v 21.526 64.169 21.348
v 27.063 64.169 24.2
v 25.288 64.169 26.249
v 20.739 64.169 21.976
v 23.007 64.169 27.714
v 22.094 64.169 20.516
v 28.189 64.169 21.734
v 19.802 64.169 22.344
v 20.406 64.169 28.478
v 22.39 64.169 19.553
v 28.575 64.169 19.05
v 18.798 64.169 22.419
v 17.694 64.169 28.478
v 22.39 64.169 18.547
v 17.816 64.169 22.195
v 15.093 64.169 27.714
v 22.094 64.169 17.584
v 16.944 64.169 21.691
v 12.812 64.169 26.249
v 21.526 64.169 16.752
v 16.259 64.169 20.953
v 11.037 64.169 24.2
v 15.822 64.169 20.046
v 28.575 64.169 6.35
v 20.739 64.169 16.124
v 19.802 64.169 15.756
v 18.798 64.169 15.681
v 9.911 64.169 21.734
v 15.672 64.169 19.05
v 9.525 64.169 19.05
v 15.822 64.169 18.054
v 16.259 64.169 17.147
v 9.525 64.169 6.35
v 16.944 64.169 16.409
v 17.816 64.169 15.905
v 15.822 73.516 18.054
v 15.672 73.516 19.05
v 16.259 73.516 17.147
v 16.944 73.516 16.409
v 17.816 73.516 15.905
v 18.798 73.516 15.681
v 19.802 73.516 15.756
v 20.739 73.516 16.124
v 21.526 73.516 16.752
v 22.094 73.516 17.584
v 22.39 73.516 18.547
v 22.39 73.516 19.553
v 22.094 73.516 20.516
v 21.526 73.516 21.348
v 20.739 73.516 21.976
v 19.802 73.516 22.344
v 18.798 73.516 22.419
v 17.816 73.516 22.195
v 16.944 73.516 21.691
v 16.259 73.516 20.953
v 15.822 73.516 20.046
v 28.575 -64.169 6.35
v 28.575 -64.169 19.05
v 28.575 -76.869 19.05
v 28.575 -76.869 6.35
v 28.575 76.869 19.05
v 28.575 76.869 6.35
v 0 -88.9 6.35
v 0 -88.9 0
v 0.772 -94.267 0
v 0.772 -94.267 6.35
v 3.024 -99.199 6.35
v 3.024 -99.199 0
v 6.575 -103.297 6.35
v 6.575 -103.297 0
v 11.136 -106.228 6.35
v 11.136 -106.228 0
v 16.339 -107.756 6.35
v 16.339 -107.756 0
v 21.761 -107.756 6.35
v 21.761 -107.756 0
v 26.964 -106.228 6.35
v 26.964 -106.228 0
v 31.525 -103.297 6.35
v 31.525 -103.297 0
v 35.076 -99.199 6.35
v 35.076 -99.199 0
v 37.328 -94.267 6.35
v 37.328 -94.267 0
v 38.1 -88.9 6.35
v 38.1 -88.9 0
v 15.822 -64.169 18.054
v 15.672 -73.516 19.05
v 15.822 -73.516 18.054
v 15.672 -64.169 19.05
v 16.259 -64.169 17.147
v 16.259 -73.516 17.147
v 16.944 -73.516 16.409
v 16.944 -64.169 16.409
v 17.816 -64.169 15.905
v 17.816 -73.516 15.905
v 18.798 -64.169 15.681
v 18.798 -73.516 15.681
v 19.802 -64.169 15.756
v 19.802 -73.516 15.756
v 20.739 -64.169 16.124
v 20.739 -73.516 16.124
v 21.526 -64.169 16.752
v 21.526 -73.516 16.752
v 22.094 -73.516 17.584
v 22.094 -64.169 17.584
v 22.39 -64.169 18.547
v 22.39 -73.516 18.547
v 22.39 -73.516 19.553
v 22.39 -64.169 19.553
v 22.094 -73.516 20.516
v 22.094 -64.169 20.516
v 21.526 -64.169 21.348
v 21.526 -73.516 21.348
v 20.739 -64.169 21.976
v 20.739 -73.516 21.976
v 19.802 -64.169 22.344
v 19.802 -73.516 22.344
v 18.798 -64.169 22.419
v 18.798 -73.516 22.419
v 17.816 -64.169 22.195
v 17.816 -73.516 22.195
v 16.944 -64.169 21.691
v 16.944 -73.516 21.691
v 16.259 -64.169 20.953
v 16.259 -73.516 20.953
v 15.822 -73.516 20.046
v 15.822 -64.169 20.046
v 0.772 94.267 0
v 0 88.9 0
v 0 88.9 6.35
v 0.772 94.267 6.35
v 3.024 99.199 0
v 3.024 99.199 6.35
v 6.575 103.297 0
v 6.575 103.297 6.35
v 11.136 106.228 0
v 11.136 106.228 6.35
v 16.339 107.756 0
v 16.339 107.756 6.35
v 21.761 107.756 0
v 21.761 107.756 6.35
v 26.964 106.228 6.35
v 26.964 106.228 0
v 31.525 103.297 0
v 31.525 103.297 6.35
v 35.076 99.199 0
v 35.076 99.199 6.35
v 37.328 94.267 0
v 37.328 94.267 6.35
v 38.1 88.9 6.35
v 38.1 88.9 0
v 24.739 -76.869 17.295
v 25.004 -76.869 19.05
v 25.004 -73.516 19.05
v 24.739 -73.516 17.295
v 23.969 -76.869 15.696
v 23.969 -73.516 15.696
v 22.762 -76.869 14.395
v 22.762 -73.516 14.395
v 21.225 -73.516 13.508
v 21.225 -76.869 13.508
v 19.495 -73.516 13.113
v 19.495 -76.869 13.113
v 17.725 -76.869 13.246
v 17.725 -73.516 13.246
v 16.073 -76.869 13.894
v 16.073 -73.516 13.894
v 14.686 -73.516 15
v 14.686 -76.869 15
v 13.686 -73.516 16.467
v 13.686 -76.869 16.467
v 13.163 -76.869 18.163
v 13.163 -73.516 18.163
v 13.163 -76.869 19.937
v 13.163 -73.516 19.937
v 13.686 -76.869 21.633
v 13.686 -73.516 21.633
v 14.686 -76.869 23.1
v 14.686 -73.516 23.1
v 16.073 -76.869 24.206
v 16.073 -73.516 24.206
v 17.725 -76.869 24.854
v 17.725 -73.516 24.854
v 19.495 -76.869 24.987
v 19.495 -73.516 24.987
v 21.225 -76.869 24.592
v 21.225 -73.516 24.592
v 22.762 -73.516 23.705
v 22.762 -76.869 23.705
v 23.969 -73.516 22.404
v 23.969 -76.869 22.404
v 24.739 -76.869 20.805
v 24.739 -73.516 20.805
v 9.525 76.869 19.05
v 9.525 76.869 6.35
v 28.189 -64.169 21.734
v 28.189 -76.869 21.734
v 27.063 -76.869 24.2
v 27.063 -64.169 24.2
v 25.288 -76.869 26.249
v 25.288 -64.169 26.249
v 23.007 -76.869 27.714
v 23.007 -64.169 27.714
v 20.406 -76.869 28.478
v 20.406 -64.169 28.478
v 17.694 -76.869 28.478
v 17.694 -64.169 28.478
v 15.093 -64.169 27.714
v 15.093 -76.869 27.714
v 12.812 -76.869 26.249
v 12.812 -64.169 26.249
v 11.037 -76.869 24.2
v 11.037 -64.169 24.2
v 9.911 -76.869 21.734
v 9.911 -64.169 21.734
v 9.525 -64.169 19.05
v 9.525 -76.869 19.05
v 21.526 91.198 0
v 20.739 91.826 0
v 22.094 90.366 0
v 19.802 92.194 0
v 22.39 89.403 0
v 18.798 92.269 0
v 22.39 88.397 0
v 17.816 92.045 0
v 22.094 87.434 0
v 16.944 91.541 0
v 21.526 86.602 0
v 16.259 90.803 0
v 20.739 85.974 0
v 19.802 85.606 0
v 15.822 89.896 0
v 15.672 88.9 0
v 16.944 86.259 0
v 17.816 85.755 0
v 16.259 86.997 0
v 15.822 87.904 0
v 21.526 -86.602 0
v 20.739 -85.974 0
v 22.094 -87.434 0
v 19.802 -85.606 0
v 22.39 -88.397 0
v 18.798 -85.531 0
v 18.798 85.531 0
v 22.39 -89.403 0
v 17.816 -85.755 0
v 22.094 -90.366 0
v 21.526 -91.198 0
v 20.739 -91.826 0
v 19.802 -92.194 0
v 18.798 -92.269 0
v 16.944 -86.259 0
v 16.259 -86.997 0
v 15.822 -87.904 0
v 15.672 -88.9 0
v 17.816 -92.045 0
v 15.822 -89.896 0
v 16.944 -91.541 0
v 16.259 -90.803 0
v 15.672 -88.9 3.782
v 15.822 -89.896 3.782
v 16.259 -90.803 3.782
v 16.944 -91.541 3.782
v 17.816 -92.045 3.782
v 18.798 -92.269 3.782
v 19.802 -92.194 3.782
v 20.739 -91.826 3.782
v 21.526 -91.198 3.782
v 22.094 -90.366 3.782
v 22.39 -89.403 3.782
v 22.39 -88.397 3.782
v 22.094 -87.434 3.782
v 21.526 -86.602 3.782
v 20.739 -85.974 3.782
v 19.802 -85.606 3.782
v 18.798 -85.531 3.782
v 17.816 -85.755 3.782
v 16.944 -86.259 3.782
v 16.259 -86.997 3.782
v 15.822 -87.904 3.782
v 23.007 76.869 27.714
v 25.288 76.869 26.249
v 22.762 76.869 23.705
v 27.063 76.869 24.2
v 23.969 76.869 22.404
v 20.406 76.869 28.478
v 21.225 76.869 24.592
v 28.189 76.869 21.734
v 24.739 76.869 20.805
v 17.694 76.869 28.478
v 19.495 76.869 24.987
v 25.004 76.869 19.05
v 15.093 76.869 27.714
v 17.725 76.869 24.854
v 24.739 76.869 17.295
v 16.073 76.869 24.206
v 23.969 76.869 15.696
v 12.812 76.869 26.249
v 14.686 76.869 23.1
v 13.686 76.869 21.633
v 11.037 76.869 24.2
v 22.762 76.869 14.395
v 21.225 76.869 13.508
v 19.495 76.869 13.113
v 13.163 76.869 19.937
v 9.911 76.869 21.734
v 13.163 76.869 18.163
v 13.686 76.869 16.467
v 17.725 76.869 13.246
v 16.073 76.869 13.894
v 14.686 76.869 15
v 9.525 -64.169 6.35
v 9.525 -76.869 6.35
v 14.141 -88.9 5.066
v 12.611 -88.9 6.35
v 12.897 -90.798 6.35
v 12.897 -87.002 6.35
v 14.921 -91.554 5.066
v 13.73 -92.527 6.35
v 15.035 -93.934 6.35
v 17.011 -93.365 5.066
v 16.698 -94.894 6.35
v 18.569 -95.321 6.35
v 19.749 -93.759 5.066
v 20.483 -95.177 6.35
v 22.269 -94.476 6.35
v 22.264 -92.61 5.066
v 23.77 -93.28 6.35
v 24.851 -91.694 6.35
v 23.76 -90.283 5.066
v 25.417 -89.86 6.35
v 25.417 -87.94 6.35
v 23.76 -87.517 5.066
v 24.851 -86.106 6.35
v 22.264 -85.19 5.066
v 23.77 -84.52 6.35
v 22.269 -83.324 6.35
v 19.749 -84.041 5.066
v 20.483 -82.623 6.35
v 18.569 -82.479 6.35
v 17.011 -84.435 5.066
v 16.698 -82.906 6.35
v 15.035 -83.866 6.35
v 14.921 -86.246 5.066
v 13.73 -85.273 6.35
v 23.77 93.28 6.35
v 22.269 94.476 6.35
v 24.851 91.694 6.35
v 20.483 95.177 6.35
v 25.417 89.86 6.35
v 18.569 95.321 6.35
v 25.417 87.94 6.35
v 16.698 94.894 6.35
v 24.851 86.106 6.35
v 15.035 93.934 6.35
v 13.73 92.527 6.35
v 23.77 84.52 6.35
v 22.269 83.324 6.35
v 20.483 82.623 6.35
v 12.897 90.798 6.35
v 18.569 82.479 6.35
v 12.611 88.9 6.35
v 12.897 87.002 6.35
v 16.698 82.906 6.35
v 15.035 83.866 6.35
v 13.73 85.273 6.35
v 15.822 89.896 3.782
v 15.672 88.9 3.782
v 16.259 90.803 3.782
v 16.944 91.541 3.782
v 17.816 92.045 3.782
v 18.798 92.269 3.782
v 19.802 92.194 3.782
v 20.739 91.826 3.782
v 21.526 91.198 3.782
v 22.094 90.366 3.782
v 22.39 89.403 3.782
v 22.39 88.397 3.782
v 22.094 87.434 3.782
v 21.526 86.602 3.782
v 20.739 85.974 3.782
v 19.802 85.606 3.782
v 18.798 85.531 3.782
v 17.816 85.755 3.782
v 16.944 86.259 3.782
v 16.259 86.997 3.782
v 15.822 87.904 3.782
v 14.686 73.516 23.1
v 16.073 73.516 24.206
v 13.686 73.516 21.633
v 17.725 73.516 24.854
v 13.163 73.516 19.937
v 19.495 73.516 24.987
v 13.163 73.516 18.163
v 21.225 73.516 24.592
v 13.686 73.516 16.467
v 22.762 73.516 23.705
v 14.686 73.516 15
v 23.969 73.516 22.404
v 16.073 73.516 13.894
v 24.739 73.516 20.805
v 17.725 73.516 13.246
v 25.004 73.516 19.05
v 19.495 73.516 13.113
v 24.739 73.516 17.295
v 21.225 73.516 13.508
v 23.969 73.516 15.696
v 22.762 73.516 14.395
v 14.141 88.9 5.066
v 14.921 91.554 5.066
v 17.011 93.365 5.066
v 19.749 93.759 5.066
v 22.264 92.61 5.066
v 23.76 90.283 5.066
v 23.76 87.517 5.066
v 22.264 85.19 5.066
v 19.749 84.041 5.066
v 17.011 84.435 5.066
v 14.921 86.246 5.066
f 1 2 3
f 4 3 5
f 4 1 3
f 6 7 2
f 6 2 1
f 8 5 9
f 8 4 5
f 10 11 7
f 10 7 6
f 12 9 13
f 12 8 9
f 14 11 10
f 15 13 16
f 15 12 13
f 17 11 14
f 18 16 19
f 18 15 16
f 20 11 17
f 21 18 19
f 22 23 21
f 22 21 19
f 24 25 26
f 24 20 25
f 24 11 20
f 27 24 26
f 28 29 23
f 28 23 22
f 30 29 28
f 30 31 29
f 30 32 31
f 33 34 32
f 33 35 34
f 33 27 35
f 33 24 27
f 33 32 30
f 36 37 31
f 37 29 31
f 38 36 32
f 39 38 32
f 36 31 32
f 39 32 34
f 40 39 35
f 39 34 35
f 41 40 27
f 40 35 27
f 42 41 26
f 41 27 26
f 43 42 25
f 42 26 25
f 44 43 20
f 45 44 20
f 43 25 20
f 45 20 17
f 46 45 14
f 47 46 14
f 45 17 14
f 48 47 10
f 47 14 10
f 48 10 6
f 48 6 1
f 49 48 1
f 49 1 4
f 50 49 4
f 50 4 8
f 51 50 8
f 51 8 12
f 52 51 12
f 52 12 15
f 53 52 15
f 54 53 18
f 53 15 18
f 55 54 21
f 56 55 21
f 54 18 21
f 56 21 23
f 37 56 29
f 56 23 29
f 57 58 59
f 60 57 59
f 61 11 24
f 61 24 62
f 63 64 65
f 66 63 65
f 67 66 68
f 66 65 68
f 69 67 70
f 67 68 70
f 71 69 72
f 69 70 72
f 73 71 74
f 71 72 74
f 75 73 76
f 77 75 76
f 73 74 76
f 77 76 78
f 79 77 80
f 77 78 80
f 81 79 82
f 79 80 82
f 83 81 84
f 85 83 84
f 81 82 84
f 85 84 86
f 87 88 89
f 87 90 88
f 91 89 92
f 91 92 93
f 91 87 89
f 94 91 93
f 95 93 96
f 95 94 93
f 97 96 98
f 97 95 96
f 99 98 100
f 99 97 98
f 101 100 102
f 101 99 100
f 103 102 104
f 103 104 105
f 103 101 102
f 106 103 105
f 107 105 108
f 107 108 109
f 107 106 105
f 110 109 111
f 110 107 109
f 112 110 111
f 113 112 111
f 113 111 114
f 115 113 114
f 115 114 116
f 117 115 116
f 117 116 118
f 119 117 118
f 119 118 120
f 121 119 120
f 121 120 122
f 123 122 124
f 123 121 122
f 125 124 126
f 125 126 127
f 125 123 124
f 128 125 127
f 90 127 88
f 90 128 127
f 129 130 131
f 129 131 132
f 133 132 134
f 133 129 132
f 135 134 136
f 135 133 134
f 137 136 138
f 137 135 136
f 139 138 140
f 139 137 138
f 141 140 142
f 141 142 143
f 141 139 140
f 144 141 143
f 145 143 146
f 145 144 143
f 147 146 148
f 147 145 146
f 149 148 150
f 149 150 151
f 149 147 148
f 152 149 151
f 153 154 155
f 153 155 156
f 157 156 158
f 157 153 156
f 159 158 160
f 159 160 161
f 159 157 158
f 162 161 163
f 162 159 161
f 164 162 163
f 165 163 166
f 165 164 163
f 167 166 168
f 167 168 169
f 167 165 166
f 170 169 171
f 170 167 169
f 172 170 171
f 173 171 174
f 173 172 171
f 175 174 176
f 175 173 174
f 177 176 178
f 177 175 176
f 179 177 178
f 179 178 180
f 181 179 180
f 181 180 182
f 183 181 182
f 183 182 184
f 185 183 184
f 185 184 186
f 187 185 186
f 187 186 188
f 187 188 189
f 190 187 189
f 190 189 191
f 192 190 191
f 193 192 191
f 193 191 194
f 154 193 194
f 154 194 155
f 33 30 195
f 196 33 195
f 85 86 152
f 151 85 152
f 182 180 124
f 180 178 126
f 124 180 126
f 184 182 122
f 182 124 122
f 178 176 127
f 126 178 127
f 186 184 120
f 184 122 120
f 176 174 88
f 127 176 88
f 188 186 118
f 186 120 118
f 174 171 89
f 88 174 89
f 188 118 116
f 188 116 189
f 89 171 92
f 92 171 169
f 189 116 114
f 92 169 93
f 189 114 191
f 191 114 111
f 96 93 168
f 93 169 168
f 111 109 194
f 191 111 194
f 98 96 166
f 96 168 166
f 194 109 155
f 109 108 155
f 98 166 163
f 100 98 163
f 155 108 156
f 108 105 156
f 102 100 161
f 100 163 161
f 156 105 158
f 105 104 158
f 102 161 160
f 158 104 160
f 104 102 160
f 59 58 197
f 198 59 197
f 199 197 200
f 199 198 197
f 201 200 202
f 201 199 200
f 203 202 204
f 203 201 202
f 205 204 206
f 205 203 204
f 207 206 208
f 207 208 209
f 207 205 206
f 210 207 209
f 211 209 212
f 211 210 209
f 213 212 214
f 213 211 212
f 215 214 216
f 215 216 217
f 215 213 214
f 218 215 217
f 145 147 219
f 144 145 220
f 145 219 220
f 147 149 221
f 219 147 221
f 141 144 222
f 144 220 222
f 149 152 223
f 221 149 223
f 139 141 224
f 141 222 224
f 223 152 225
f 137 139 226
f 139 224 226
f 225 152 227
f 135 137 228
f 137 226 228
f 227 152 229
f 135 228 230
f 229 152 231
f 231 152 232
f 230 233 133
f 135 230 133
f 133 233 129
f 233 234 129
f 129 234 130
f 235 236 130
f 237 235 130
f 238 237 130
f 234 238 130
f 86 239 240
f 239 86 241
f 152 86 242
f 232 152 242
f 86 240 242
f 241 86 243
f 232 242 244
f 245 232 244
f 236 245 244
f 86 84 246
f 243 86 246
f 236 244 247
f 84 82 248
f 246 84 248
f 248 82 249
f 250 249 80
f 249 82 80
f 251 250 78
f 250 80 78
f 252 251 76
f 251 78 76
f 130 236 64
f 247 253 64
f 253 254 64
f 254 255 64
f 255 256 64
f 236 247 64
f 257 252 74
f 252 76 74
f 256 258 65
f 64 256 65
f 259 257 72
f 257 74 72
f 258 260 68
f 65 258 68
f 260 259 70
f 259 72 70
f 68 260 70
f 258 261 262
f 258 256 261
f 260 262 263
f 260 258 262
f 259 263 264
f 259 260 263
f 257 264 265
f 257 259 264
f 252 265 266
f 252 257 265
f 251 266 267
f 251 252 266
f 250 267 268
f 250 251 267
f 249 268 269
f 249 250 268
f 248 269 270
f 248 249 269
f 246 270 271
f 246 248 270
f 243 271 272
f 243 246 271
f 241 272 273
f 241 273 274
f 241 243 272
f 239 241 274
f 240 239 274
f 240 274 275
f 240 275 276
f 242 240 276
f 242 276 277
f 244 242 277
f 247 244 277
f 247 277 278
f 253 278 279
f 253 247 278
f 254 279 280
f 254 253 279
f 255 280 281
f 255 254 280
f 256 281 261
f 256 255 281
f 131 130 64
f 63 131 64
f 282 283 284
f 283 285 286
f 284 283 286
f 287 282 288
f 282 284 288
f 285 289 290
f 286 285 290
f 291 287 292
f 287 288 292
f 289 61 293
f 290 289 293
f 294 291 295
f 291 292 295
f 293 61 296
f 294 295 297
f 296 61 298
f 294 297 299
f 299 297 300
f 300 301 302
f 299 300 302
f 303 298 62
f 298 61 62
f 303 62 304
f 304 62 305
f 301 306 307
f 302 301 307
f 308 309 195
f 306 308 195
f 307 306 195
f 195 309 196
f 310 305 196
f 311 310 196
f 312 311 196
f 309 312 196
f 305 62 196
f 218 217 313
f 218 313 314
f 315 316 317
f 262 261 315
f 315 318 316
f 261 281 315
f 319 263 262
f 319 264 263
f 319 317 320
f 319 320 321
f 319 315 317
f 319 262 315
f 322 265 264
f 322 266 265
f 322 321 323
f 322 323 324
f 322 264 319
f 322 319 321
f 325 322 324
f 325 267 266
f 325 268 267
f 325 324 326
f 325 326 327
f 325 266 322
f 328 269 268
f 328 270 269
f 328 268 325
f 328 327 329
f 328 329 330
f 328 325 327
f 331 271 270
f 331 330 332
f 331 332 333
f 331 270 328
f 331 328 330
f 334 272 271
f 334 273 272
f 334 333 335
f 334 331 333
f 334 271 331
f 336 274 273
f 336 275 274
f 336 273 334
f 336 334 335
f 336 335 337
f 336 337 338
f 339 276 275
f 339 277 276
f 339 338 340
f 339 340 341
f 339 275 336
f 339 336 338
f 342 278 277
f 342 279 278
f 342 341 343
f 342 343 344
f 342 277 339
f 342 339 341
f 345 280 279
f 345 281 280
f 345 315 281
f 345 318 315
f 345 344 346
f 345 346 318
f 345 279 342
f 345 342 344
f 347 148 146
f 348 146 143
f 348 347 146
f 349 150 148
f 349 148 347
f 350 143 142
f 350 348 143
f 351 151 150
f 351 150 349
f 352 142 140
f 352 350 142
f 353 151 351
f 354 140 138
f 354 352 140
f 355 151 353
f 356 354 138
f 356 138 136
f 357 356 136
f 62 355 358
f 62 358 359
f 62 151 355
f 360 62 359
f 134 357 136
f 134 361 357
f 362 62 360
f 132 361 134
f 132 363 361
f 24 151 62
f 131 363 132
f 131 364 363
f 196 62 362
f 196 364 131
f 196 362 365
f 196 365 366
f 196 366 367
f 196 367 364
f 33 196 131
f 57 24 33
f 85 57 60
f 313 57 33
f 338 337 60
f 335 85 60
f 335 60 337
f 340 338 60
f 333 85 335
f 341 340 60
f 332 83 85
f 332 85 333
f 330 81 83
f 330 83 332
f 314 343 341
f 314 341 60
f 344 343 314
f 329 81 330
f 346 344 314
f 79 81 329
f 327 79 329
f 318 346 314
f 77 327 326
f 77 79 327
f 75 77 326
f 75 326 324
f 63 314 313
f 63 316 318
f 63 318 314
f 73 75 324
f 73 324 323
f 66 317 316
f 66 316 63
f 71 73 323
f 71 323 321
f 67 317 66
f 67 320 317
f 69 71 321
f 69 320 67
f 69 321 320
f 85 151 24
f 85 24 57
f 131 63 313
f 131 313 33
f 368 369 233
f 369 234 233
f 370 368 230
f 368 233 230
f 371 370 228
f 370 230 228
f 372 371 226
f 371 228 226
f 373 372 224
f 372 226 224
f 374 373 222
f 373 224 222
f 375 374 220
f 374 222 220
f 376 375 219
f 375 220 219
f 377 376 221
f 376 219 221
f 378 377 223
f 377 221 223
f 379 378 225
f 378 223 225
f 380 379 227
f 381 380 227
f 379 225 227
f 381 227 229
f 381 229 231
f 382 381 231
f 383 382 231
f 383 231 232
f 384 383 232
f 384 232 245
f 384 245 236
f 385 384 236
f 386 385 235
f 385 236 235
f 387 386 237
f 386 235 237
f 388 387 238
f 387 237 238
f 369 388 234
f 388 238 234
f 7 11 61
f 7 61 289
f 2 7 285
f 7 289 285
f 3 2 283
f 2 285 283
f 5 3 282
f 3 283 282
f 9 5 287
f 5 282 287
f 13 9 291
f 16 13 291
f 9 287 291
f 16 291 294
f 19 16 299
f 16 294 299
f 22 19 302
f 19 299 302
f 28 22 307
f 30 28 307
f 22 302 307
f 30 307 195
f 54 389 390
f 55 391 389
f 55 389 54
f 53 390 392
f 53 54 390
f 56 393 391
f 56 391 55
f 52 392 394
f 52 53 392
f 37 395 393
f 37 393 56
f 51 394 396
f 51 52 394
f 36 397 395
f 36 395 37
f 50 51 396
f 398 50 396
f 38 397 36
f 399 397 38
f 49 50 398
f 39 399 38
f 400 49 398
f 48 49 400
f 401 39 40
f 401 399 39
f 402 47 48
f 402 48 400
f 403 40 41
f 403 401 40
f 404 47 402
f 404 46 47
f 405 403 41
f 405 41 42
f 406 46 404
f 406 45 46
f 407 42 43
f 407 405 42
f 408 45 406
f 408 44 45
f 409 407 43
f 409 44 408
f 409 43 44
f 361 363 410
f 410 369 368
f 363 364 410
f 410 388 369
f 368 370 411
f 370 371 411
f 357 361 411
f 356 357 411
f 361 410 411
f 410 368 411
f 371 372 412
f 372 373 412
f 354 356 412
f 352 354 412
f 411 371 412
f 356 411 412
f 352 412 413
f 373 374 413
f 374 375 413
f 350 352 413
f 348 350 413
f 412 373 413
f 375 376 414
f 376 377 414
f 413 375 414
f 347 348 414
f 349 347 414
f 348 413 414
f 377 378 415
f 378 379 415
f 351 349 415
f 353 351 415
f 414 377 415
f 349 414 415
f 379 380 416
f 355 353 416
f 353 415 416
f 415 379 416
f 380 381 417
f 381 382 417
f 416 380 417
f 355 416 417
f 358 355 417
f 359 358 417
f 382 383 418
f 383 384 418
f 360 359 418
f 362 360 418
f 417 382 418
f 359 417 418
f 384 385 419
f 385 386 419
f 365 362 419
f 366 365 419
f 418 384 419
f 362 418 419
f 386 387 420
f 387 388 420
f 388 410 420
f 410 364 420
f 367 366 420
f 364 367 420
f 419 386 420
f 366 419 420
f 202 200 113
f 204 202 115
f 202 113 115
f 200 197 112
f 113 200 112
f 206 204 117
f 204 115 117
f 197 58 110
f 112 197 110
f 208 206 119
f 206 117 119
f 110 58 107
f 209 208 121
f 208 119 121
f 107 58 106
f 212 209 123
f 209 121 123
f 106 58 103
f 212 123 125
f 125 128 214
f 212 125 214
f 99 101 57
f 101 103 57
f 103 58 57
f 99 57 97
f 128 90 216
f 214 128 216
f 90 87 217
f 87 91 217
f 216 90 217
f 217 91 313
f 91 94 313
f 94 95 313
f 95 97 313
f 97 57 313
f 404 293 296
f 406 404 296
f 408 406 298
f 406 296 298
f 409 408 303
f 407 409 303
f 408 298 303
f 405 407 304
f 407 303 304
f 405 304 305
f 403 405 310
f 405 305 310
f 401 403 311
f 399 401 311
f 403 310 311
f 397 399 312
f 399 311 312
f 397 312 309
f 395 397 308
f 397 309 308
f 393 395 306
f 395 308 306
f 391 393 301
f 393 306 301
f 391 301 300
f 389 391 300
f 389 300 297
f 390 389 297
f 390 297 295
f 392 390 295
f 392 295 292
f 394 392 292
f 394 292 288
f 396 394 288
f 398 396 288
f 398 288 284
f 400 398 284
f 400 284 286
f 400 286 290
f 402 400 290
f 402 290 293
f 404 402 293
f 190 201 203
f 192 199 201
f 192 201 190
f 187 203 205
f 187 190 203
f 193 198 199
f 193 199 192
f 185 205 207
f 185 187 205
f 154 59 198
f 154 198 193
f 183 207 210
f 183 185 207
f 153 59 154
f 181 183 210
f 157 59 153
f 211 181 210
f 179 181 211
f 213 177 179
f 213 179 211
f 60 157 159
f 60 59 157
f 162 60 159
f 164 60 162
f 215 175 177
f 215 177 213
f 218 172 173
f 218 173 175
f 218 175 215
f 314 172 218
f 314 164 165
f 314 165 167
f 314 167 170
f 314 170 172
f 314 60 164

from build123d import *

# Parameters (mm, degrees)
BOSS_EXTRUDE1_DEPTH                                 = 6.35
CSK_FOR_1_4_FLAT_HEAD_MACHINE_SCREW_100_D           = 6.7564
CSK_FOR_1_4_FLAT_HEAD_MACHINE_SCREW_100_CSINK_D     = 12.8778
CSK_FOR_1_4_FLAT_HEAD_MACHINE_SCREW_100_CSINK_ANGLE = 100
SKETCH6_W                                           = 19.05
SKETCH6_H                                           = 12.7
BOSS_EXTRUDE2_DEPTH                                 = 12.7
BOSS_EXTRUDE3_DEPTH                                 = 12.7
CBORE_FOR_1_4_BUTTON_HEAD_CAP_SCREW1_D              = 6.7564
CBORE_FOR_1_4_BUTTON_HEAD_CAP_SCREW1_CBORE_D        = 11.90752
CBORE_FOR_1_4_BUTTON_HEAD_CAP_SCREW1_CBORE_DEPTH    = 3.3528


with BuildPart() as part:
    # Sketch1 → Boss-Extrude1 (new body)
    with BuildSketch(Plane.XY):
        with BuildLine():
            Line((0, 0), (0, 88.9))
            ThreePointArc((0, 88.9), (19.05, 107.95), (38.1, 88.9))
            Line((38.1, 88.9), (38.1, 0))
            Line((38.1, 0), (0, 0))
        make_face()
    extrude(amount=BOSS_EXTRUDE1_DEPTH)

    # CSK for 1/4 Flat Head Machine Screw (100)1 (through all)
    with Locations(Plane.XY.offset(6.35)):
        with Locations((19.05, 88.9)):
            CounterSinkHole(CSK_FOR_1_4_FLAT_HEAD_MACHINE_SCREW_100_D / 2, CSK_FOR_1_4_FLAT_HEAD_MACHINE_SCREW_100_CSINK_D / 2, counter_sink_angle=CSK_FOR_1_4_FLAT_HEAD_MACHINE_SCREW_100_CSINK_ANGLE)

    # Sketch6 → Boss-Extrude2 (add)
    with BuildSketch(Plane.XY.offset(6.35)):
        with Locations((19.05, 70.519259932)):
            Rectangle(SKETCH6_W, SKETCH6_H)
    extrude(amount=BOSS_EXTRUDE2_DEPTH)

    # Sketch10 → Boss-Extrude3 (add)
    with BuildSketch(Plane(origin=(0, 76.869259932, 0), x_dir=(1, 0, 0), z_dir=(0, 1, 0))):
        with BuildLine():
            Line((9.525, -19.05), (28.575, -19.05))
            ThreePointArc((28.575, -19.05), (19.05, -28.575), (9.525, -19.05))
        make_face()
    extrude(amount=-BOSS_EXTRUDE3_DEPTH)

    # CBORE for 1/4 Button Head Cap Screw1 (through all)
    with Locations(Plane(origin=(0, 76.869259932, 0), x_dir=(1, 0, 0), z_dir=(0, 1, 0))):
        with Locations((19.05, -19.05)):
            CounterBoreHole(CBORE_FOR_1_4_BUTTON_HEAD_CAP_SCREW1_D / 2, CBORE_FOR_1_4_BUTTON_HEAD_CAP_SCREW1_CBORE_D / 2, CBORE_FOR_1_4_BUTTON_HEAD_CAP_SCREW1_CBORE_DEPTH)

    # Mirror1: part across plane


with BuildPart() as part_1:
    add(part.part)
    add(part.part.mirror(Plane(origin=(0, 0, 6.35), x_dir=(0, 0, 1), z_dir=(0, 1, 0))))


solid = part_1.part
